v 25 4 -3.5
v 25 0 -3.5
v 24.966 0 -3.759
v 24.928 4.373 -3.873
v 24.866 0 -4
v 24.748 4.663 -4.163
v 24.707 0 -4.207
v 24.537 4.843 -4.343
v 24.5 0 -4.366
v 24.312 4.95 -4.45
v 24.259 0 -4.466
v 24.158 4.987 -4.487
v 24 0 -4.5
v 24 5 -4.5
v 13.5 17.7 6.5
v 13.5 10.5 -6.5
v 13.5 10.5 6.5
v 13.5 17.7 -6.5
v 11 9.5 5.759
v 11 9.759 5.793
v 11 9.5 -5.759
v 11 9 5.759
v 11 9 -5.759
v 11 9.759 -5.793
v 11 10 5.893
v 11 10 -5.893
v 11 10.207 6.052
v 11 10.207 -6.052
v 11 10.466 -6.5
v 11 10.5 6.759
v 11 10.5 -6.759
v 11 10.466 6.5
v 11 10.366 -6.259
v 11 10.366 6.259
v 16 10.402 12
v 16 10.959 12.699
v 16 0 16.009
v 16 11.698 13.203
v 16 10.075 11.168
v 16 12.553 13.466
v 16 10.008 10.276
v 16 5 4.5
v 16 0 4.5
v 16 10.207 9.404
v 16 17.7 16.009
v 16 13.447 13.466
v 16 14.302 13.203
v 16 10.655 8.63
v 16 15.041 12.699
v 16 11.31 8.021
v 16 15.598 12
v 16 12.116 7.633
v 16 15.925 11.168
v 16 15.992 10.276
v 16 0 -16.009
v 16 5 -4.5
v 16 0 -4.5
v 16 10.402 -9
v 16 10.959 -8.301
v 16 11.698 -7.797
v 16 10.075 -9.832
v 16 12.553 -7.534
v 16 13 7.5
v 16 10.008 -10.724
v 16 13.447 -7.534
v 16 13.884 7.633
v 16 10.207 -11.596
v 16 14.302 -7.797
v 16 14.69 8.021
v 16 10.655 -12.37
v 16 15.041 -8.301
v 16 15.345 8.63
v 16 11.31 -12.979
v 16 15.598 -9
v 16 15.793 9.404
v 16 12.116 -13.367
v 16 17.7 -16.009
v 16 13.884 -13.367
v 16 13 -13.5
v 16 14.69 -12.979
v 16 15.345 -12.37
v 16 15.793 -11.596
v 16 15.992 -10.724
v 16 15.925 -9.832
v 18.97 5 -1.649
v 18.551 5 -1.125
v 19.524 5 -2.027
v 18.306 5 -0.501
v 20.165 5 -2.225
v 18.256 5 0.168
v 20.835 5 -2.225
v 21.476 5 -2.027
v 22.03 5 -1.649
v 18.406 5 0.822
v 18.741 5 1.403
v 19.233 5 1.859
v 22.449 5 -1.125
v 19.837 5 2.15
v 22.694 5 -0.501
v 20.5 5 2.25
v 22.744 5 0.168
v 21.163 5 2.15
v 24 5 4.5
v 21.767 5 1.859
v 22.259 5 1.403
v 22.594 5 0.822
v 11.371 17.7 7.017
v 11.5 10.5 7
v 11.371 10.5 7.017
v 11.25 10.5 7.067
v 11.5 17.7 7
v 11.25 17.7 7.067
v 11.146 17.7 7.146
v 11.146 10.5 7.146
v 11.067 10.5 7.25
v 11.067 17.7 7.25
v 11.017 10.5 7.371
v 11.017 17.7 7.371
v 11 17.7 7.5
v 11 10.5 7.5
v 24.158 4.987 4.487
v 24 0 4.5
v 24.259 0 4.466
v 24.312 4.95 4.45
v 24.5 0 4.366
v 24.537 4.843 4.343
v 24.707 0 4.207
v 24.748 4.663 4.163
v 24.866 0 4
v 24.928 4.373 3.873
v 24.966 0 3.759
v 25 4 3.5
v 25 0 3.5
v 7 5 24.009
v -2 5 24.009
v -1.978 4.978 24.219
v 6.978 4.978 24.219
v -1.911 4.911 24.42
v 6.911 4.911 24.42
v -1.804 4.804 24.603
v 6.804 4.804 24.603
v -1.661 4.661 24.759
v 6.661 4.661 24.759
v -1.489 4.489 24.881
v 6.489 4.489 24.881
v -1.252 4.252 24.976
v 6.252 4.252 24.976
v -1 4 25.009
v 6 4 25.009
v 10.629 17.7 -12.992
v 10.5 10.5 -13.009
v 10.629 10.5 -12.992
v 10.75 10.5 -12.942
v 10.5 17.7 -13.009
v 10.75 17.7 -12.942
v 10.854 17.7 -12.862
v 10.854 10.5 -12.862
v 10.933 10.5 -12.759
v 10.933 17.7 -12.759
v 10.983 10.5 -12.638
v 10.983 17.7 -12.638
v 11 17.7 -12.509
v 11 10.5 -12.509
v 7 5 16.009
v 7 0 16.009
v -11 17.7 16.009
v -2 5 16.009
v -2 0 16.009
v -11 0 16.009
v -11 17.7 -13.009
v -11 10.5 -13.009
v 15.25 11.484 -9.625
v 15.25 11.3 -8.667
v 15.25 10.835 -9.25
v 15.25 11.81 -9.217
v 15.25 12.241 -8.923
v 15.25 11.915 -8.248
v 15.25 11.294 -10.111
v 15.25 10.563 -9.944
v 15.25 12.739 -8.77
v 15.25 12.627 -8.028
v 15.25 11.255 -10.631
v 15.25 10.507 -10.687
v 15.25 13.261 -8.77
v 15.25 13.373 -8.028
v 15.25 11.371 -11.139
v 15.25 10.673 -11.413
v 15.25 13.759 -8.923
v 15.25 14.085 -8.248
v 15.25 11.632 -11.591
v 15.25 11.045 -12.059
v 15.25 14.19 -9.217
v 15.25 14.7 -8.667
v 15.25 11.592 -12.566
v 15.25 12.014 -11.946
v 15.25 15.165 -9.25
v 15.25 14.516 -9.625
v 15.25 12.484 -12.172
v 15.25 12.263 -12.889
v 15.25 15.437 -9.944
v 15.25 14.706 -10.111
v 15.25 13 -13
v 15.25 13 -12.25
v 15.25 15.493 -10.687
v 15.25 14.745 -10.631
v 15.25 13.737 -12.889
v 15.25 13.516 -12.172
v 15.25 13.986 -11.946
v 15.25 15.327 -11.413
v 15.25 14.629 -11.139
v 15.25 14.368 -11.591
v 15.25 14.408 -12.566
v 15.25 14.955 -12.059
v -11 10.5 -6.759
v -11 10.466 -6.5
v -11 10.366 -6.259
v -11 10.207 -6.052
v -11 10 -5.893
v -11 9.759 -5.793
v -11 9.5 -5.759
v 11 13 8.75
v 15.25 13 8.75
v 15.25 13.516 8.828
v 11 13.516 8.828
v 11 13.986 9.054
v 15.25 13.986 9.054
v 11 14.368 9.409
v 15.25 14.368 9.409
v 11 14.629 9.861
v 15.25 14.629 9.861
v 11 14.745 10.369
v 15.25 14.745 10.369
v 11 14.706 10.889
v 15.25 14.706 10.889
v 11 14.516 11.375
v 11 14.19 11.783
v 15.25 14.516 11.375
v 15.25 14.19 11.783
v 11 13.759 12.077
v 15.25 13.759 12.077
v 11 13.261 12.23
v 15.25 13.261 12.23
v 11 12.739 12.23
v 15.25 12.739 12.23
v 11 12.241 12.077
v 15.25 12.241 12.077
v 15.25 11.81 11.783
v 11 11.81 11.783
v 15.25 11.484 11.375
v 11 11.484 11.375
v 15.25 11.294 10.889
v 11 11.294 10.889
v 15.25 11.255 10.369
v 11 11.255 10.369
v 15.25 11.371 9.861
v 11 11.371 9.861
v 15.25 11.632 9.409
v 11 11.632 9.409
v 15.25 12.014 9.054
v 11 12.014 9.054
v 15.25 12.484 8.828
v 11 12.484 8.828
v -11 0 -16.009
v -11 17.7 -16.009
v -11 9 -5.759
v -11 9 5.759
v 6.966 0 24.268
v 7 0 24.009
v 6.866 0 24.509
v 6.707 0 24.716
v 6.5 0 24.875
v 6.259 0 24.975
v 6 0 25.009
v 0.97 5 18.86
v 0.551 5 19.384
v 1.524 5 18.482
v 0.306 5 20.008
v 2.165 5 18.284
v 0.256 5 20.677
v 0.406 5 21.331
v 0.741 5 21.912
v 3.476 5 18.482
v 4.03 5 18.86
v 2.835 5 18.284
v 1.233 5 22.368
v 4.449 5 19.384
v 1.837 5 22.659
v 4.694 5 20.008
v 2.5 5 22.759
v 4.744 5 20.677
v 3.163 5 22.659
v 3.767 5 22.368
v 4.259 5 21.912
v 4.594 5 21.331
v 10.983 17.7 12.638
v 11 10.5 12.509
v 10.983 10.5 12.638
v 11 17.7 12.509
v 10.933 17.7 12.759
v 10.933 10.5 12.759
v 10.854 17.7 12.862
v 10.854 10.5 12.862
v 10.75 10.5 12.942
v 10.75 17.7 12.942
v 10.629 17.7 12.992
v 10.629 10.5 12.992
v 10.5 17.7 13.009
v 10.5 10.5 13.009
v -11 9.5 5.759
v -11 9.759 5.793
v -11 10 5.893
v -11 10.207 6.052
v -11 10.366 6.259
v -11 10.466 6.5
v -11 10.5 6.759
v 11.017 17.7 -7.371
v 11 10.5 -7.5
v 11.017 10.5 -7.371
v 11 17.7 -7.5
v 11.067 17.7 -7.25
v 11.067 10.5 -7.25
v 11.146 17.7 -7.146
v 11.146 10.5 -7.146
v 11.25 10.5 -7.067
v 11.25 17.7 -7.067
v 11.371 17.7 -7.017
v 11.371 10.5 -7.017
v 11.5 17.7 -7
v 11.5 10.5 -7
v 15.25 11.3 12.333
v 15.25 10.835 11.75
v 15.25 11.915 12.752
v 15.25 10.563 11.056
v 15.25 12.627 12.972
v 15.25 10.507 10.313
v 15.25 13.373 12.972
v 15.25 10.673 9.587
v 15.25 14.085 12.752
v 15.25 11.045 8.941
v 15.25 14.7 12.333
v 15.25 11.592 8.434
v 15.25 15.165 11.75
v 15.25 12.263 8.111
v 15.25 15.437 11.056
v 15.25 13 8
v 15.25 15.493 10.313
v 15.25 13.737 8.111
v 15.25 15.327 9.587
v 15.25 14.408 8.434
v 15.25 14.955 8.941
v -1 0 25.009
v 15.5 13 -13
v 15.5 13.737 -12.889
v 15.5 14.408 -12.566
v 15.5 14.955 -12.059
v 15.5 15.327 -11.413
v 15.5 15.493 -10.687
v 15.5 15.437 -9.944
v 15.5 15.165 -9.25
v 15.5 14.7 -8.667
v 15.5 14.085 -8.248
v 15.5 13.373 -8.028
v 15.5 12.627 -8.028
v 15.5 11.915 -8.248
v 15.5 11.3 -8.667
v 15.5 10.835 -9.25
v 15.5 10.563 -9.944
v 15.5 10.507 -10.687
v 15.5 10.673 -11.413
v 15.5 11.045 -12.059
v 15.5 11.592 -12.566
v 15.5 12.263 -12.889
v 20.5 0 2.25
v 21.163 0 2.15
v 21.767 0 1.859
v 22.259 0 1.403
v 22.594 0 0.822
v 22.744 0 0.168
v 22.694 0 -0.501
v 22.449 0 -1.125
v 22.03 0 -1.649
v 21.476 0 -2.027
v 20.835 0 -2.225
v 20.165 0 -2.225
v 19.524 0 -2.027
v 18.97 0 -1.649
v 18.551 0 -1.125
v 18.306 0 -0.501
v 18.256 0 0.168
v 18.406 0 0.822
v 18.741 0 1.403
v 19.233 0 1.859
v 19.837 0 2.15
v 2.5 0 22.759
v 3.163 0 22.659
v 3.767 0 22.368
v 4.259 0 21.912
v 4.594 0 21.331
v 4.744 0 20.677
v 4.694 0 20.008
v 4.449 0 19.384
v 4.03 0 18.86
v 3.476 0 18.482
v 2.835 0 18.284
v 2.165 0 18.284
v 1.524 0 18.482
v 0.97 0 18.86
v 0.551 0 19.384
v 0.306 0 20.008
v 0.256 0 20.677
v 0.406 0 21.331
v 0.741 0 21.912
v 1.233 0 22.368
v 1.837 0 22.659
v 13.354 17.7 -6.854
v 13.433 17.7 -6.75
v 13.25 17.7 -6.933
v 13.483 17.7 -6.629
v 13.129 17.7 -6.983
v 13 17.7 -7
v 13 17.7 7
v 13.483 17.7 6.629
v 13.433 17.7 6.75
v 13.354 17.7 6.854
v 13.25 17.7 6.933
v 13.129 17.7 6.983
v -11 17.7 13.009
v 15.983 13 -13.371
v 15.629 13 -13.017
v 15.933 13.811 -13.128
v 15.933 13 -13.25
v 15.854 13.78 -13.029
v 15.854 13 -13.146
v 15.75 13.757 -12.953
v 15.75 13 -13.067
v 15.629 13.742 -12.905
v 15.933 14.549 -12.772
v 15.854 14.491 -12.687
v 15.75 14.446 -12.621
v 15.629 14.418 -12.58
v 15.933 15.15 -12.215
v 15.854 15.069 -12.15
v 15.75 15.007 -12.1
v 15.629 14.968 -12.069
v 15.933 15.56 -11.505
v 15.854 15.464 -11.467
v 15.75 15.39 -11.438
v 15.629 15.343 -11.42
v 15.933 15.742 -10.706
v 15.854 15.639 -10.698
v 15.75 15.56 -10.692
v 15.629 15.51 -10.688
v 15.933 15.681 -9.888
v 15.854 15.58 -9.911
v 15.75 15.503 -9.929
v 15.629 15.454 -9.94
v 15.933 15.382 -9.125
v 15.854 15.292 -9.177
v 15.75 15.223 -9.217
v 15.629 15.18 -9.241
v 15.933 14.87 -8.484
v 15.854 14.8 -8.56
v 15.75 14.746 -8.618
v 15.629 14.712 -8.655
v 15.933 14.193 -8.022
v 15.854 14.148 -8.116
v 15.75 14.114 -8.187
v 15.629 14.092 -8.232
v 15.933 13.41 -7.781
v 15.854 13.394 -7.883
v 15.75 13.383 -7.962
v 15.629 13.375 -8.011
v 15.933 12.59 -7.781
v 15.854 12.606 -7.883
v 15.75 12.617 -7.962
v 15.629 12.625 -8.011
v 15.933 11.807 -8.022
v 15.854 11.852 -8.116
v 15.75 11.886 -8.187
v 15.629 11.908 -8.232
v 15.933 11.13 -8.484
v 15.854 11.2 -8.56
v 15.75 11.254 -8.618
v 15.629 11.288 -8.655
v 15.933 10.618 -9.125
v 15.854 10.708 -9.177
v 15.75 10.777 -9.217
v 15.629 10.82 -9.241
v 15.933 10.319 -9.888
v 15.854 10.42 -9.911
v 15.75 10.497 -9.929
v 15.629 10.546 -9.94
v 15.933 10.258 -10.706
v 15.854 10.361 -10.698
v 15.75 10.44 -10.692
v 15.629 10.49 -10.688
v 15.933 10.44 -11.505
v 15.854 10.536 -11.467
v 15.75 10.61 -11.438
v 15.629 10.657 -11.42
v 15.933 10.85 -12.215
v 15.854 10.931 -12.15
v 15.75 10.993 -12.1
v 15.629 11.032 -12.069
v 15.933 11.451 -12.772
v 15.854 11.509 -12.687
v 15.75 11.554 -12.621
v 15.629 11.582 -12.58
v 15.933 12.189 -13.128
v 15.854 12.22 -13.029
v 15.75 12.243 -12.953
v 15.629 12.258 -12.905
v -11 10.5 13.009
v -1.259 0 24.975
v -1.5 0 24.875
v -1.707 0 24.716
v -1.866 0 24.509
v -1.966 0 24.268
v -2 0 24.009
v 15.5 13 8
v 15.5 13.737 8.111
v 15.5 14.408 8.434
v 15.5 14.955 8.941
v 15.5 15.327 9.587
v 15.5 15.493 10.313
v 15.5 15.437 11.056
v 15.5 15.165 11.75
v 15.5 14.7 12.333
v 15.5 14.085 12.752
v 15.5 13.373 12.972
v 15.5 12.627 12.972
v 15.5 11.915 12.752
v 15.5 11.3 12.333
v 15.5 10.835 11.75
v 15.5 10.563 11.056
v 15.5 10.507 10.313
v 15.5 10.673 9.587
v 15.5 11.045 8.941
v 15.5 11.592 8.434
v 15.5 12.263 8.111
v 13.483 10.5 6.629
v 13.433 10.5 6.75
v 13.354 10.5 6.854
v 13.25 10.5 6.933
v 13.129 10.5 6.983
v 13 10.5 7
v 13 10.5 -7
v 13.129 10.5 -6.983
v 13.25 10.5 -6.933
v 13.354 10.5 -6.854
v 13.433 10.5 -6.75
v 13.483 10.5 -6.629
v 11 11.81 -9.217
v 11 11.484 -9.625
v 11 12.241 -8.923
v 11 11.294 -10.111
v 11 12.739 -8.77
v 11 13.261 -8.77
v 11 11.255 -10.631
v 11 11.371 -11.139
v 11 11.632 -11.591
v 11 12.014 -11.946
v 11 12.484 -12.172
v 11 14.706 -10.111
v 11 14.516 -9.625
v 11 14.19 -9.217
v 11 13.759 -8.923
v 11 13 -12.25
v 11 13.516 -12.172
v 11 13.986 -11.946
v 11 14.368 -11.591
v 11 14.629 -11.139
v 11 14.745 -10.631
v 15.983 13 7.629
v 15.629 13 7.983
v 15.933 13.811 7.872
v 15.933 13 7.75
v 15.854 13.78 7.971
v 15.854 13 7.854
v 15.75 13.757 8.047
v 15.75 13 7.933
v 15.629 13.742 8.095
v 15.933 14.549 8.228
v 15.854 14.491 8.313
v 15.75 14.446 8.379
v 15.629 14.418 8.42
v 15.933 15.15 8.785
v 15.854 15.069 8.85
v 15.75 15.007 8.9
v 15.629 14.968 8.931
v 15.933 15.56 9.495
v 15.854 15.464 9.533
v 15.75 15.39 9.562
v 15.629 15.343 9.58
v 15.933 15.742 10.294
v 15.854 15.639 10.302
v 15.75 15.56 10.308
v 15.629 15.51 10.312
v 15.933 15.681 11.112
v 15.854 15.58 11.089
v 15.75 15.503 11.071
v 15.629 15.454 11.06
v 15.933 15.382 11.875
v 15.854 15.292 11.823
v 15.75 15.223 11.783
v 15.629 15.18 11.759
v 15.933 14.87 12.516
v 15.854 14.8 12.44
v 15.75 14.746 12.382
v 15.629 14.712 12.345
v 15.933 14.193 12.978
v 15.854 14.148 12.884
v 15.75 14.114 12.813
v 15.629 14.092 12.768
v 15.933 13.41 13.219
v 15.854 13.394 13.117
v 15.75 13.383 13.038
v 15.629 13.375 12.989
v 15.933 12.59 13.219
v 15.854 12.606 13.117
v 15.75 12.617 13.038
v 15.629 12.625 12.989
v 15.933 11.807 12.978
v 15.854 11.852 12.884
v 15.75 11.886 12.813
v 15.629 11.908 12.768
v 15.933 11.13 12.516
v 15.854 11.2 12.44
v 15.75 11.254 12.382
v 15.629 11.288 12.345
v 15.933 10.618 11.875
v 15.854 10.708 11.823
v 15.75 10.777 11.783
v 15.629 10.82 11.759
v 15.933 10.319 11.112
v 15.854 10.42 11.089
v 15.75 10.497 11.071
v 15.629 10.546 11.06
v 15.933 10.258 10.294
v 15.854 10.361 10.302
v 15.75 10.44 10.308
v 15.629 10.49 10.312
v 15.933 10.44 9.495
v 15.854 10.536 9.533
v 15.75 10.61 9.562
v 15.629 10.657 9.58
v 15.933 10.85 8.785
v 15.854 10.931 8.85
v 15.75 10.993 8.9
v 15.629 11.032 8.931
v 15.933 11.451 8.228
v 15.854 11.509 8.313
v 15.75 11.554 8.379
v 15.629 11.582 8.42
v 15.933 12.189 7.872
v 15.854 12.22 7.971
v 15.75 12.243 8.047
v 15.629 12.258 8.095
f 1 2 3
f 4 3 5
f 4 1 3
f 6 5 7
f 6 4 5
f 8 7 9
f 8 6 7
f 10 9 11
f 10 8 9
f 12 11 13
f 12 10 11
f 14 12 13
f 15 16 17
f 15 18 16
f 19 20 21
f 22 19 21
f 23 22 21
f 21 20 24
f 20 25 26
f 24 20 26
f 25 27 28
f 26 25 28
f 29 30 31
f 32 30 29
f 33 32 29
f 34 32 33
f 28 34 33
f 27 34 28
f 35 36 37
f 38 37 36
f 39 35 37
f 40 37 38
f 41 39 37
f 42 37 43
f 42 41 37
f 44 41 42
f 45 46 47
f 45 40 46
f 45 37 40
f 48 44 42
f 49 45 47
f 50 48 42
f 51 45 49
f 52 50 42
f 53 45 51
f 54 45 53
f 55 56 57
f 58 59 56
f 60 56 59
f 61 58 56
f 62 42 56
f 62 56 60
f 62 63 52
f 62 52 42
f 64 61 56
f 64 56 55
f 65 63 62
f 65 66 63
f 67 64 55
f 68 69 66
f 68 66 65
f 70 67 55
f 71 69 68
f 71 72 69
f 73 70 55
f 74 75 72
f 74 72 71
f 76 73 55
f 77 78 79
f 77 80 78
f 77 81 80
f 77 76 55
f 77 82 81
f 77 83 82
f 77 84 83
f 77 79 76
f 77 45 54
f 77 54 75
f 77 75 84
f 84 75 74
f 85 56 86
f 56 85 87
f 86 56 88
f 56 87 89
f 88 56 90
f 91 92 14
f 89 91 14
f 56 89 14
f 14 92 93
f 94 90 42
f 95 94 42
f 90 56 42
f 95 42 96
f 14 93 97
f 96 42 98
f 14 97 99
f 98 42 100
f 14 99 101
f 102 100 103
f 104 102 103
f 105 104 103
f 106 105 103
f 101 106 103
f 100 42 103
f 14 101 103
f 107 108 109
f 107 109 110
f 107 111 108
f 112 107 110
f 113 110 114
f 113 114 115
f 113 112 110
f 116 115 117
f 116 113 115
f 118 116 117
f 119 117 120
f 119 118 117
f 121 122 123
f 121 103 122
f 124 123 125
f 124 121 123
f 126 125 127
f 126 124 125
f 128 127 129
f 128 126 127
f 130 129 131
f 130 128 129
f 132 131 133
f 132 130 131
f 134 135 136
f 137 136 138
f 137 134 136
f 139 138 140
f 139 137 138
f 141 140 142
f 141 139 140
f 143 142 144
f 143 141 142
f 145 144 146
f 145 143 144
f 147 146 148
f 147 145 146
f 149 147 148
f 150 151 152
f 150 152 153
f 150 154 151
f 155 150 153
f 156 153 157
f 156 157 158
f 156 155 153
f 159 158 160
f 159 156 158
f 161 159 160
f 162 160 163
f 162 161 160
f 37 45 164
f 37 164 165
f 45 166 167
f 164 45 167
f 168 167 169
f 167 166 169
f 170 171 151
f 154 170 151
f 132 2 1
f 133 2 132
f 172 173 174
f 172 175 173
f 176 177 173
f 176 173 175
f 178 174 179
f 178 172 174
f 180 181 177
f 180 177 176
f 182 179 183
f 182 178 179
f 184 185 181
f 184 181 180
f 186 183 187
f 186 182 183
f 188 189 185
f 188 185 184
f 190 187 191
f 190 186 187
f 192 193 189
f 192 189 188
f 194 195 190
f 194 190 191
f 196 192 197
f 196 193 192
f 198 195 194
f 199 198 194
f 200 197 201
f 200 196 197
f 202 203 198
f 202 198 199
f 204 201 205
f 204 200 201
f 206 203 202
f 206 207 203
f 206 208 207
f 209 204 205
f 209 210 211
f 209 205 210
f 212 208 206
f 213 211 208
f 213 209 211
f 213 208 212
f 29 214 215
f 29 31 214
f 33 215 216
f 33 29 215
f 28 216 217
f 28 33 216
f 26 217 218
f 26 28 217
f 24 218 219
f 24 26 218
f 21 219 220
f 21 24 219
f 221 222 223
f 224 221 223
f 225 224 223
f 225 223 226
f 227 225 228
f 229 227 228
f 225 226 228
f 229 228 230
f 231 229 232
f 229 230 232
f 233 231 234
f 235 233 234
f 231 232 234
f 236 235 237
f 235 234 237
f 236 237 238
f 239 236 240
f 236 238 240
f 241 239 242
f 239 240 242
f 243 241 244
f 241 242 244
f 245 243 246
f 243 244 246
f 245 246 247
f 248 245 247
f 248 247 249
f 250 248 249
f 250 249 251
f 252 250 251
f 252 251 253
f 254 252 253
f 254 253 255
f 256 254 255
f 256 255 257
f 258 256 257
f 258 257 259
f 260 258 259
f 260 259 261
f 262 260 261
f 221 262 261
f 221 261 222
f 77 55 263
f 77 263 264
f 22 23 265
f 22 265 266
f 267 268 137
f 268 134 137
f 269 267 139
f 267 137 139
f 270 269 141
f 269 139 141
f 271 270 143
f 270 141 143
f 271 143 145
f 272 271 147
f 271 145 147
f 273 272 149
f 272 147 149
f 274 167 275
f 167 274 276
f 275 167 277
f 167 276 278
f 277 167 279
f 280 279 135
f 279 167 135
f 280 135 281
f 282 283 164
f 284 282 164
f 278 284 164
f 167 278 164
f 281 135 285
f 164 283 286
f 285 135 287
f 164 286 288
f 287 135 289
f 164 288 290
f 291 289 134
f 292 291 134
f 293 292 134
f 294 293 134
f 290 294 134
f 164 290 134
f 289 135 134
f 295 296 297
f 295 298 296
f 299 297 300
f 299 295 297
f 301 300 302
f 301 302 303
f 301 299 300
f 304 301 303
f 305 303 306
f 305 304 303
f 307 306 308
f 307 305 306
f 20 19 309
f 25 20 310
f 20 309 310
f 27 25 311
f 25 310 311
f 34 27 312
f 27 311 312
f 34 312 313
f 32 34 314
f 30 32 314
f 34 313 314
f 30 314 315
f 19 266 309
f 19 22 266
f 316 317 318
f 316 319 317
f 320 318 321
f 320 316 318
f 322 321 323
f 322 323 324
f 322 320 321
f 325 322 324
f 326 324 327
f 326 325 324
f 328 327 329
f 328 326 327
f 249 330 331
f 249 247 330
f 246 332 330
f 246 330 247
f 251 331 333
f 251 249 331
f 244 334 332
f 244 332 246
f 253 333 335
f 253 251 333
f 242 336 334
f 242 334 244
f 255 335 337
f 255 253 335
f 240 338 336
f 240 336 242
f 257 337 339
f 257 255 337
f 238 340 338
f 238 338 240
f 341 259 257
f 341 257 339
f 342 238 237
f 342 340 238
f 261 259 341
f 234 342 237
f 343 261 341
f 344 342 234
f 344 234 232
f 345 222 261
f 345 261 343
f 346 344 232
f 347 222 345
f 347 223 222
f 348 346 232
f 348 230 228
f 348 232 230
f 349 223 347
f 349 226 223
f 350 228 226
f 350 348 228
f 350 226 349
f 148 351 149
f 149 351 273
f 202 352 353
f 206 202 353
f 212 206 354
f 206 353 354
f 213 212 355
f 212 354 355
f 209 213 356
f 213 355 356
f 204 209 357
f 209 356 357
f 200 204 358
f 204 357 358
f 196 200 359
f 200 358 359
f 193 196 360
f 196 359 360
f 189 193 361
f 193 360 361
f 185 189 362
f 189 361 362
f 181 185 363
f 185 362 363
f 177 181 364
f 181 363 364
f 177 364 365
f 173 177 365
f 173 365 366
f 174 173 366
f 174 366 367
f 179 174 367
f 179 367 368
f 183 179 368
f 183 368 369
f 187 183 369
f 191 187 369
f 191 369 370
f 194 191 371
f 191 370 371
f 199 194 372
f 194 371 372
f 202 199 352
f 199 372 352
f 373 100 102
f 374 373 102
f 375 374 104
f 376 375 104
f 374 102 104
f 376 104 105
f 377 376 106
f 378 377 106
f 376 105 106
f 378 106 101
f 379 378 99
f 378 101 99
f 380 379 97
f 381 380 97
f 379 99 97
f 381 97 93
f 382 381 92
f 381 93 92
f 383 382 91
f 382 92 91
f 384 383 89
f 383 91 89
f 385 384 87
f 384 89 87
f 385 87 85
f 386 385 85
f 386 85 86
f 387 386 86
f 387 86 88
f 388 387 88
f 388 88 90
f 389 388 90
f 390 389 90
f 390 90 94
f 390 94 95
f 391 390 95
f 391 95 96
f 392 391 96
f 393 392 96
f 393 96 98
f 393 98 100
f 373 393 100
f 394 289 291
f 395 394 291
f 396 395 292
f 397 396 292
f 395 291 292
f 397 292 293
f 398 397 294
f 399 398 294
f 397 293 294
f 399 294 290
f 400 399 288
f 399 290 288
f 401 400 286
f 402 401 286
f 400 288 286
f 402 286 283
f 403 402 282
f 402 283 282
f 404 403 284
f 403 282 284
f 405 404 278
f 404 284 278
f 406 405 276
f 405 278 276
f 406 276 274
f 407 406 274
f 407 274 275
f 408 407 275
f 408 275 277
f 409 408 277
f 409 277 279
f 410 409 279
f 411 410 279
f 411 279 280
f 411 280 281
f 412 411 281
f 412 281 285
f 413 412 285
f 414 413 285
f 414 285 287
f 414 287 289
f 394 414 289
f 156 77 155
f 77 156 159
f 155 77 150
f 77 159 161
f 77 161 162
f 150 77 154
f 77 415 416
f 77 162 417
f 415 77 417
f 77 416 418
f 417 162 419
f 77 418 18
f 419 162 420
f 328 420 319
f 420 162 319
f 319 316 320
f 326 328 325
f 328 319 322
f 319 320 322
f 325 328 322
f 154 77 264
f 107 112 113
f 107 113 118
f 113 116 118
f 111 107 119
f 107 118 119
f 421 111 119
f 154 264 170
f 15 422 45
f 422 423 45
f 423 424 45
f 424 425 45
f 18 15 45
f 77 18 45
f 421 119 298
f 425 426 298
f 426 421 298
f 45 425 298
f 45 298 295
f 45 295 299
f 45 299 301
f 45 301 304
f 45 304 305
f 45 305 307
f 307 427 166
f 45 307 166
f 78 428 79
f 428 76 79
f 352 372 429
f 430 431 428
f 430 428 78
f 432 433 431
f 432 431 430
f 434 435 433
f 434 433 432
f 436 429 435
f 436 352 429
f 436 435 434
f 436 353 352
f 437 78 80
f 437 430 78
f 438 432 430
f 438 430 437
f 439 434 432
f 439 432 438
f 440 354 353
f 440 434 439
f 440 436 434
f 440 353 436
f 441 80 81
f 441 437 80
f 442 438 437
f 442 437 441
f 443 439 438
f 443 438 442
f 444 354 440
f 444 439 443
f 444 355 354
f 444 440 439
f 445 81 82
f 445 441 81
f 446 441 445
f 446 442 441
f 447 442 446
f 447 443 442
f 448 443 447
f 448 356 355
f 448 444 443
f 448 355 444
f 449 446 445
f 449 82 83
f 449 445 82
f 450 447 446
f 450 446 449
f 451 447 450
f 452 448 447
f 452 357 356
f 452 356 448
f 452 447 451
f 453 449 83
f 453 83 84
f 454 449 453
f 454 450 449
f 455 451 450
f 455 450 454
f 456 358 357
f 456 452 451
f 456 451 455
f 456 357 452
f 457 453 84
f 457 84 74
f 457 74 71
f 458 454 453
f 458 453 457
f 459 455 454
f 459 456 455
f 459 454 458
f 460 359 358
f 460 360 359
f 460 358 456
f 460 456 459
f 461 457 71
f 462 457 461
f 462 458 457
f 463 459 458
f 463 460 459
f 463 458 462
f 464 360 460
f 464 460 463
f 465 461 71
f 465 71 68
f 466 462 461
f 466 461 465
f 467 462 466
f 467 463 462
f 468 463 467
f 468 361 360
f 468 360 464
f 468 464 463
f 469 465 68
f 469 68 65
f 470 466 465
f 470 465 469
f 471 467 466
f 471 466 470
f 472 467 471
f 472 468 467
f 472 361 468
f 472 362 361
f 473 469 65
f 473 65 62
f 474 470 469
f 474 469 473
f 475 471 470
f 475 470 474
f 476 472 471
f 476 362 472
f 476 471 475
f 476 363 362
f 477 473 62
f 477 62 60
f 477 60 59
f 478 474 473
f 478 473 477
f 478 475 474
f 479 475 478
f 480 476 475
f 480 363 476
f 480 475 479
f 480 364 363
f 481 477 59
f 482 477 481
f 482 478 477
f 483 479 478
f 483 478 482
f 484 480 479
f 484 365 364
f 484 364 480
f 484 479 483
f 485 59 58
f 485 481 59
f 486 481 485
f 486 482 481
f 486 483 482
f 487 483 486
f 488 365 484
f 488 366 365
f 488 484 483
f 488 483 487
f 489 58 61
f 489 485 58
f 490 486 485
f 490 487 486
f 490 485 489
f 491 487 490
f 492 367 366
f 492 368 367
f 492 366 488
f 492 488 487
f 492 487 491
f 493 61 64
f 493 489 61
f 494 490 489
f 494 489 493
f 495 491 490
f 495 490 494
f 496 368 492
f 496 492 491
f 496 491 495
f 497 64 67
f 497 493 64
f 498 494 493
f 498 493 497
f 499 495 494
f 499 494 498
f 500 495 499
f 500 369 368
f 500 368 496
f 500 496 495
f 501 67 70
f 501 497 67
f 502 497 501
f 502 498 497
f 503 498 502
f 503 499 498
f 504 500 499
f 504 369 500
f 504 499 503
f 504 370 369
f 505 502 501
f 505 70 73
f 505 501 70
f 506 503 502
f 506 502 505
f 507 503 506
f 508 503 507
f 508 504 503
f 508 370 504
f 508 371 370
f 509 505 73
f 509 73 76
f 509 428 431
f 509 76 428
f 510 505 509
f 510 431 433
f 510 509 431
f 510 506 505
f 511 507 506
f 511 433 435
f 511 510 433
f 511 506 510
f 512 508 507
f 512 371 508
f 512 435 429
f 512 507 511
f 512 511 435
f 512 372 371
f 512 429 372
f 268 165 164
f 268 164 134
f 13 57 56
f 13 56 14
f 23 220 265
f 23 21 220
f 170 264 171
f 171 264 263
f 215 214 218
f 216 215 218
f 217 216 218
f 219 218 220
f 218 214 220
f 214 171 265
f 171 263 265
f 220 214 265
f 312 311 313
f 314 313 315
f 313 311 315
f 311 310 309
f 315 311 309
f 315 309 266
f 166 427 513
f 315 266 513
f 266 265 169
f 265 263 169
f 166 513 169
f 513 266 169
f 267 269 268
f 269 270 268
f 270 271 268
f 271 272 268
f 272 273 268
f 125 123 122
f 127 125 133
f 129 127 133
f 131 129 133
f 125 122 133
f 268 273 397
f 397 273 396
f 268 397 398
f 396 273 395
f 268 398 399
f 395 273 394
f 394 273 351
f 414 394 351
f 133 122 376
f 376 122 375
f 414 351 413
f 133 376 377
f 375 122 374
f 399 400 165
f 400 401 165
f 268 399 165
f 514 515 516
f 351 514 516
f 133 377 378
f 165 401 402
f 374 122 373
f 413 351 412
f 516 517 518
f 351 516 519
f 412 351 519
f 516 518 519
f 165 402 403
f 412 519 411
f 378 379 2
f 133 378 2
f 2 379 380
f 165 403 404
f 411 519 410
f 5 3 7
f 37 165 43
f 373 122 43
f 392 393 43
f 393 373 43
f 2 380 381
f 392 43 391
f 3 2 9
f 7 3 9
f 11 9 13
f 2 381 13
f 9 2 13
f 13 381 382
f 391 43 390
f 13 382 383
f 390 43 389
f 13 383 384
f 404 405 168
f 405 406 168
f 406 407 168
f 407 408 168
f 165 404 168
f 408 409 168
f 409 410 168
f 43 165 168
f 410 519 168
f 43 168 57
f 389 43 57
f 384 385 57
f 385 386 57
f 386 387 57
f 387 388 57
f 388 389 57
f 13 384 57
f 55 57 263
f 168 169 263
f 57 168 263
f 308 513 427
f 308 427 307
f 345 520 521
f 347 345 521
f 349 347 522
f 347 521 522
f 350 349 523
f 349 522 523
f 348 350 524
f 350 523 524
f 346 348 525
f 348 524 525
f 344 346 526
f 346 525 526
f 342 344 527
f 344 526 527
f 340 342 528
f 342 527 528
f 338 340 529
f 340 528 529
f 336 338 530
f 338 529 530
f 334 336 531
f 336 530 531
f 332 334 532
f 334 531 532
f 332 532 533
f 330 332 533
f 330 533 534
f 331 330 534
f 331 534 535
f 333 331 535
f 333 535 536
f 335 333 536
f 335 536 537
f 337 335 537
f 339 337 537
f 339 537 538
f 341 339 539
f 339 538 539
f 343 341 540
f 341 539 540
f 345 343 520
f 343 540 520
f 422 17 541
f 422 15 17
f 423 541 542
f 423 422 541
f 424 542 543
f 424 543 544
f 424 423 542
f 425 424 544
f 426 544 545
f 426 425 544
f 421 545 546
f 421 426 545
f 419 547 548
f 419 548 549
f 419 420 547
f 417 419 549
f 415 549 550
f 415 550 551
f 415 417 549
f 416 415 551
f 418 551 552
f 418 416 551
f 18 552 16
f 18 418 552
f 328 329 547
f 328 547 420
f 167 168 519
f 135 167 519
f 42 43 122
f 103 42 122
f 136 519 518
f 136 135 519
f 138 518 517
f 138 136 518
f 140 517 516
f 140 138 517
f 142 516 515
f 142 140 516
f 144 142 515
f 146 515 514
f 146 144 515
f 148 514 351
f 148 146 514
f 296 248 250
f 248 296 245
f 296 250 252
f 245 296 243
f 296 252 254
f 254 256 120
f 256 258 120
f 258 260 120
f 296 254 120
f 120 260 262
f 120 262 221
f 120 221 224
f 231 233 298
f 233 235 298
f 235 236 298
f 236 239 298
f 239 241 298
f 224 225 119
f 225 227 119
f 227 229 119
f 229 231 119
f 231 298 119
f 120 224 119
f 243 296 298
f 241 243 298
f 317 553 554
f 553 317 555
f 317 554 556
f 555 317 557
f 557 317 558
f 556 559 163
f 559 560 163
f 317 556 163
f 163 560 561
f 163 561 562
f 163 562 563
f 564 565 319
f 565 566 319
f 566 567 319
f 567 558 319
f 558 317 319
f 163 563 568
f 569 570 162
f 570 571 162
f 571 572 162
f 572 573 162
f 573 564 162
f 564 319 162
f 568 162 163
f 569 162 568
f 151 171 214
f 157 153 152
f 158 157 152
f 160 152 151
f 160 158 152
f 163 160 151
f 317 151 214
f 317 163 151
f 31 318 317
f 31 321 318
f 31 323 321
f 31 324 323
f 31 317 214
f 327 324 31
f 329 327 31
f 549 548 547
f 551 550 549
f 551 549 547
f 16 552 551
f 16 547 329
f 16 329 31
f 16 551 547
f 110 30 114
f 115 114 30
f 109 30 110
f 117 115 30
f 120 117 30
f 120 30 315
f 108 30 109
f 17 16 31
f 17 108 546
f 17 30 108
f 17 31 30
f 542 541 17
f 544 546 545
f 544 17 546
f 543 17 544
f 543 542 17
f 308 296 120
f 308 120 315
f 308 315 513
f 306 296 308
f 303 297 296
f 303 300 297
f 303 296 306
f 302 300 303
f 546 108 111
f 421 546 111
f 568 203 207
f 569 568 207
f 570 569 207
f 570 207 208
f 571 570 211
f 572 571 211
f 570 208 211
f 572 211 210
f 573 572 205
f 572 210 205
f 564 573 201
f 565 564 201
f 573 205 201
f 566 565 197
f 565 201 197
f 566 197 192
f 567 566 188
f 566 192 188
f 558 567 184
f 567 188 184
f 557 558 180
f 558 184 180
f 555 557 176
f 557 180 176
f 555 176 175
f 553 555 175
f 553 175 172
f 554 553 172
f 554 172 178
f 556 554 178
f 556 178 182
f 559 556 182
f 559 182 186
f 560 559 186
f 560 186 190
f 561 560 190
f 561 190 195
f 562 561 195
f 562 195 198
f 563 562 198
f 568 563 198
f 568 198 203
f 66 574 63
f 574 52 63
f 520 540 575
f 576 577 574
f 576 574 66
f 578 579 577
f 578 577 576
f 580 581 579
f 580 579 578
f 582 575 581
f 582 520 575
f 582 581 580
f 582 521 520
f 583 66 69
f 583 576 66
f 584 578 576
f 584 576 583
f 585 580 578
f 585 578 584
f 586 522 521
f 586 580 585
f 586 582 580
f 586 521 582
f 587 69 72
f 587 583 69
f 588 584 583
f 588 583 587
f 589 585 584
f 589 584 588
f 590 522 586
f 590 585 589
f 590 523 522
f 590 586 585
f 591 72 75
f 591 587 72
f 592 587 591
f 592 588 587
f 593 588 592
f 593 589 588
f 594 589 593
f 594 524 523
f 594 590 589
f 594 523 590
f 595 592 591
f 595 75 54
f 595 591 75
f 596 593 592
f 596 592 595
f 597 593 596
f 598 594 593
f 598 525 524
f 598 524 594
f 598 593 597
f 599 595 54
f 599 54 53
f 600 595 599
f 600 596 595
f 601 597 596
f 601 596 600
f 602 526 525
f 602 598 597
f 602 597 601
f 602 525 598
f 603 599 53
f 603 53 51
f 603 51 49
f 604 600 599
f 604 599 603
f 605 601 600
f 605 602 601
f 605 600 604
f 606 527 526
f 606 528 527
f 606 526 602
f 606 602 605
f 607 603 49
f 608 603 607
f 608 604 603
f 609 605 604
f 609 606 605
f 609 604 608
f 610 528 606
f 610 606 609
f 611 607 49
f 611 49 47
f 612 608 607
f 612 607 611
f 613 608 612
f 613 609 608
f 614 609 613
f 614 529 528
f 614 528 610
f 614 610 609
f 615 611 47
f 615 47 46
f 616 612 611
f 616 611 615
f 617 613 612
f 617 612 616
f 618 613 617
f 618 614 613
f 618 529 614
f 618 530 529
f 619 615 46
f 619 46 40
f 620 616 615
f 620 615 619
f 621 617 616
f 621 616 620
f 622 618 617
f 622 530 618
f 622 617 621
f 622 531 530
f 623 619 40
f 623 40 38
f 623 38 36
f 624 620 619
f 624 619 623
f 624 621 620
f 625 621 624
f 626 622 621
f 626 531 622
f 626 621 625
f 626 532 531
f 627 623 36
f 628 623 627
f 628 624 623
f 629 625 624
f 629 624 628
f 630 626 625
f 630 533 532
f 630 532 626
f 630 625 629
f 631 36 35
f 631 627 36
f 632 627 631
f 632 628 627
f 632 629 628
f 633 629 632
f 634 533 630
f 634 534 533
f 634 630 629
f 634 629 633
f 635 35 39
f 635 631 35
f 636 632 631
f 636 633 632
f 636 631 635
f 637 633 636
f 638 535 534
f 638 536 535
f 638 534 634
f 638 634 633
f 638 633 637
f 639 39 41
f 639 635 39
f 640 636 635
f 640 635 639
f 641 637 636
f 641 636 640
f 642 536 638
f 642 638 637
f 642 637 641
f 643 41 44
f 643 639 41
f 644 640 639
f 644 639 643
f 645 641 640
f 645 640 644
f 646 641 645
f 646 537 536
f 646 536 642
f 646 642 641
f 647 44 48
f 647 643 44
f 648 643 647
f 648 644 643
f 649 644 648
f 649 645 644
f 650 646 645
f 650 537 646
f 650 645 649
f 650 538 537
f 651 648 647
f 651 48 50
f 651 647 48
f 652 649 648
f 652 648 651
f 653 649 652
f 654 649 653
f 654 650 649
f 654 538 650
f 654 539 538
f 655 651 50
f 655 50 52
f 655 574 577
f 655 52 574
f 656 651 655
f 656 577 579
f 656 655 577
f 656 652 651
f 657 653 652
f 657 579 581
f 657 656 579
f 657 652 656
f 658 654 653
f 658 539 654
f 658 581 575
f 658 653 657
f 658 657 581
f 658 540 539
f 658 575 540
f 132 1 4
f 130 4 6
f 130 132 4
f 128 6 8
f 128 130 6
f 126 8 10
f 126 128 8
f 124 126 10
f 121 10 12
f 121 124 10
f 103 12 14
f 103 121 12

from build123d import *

# Parameters (mm, degrees)
BOSS_EXTRUDE1_DEPTH = 11
SKETCH3_W           = 22
SKETCH3_H           = 3
BOSS_EXTRUDE2_DEPTH = 17.7
BOSS_EXTRUDE3_DEPTH = 5
SKETCH5_R           = 1.75
CUT_EXTRUDE1_DEPTH  = 37.035744466
SKETCH6_W           = 9
SKETCH6_H           = 9
BOSS_EXTRUDE4_DEPTH = 5
SKETCH7_R           = 2.25
CUT_EXTRUDE2_DEPTH  = 38.573063213
FILLET1_R           = 1
SKETCH8_R           = 2.5
CUT_EXTRUDE3_DEPTH  = 0.75
FILLET2_R           = 0.5
SKETCH10_W          = 14
SKETCH10_H          = 7.2
CUT_EXTRUDE4_DEPTH  = 2.5
FILLET3_R           = 0.5


with BuildPart() as part:
    # Sketch1 → Boss-Extrude1 (new, symmetric)
    with BuildSketch(Plane(origin=(0, 0, 0), x_dir=(0, 0, -1), z_dir=(1, 0, 0))):
        Polygon((-13.0089, 0), (13.0089, 0), (13.0089, 10.5), (5.7589, 10.5), (5.7589, 9), (-5.7589, 9), (-5.7589, 10.5), (-13.0089, 10.5), align=None)
    extrude(amount=BOSS_EXTRUDE1_DEPTH, both=True)

    # Sketch3 → Boss-Extrude2 (add)
    with BuildSketch(Plane.XZ):
        with Locations((0, -14.5089)):
            Rectangle(SKETCH3_W, SKETCH3_H)
        with Locations((0, 14.5089)):
            Rectangle(SKETCH3_W, SKETCH3_H)
    extrude(amount=-BOSS_EXTRUDE2_DEPTH)

    # Sketch4 → Boss-Extrude3 (add)
    with BuildSketch(Plane(origin=(11, 0, 0), x_dir=(0, 0, -1), z_dir=(1, 0, 0))):
        Polygon((-8.8, 17.7), (-16.0089, 17.7), (-16.0089, 0), (16.0089, 0), (16.0089, 17.7), align=None)
    extrude(amount=BOSS_EXTRUDE3_DEPTH)

    # Sketch5 → Cut-Extrude1 (cut, through all)
    with BuildSketch(Plane(origin=(16, 0, 0), x_dir=(0, 0, -1), z_dir=(1, 0, 0))):
        with Locations((-10.5, 13)):
            Circle(SKETCH5_R)
        with Locations((10.5, 13)):
            Circle(SKETCH5_R)
    extrude(amount=-CUT_EXTRUDE1_DEPTH, mode=Mode.SUBTRACT)

    # Sketch6 → Boss-Extrude4 (add)
    with BuildSketch(Plane.XZ):
        with Locations((20.5, 0)):
            Rectangle(SKETCH6_W, SKETCH6_H)
        with Locations((2.5, 20.5089)):
            Rectangle(SKETCH6_W, SKETCH6_H)
    extrude(amount=-BOSS_EXTRUDE4_DEPTH)

    # Sketch7 → Cut-Extrude2 (cut, through all)
    with BuildSketch(Plane(origin=(0, 5, 0), x_dir=(1, 0, 0), z_dir=(0, 1, 0))):
        with Locations(Location((20.5, 0, 0), (0, 0, 270))):
            Circle(SKETCH7_R)
        with Locations(Location((2.5, -20.5089, 0), (0, 0, 270))):
            Circle(SKETCH7_R)
    extrude(amount=-CUT_EXTRUDE2_DEPTH, mode=Mode.SUBTRACT)

    # Fillet1
    fillet1_edges = [part.edges().sort_by_distance(p)[0] for p in [
        (0, 10.5, 5.7589),
        (0, 10.5, -5.7589),
        (25, 5, 0),
        (25, 2.5, 4.5),
        (25, 2.5, -4.5),
        (7, 2.5, 25.0089),
        (2.5, 5, 25.0089),
        (-2, 2.5, 25.0089),
    ]]
    fillet(fillet1_edges, radius=FILLET1_R)

    # Sketch8 → Cut-Extrude3 (cut)
    with BuildSketch(Plane(origin=(16, 0, 0), x_dir=(0, 0, -1), z_dir=(1, 0, 0))):
        with Locations((-10.5, 13)):
            Circle(SKETCH8_R)
        with Locations((10.5, 13)):
            Circle(SKETCH8_R)
    extrude(amount=-CUT_EXTRUDE3_DEPTH, mode=Mode.SUBTRACT)

    # Fillet2
    fillet2_edges = [part.edges().sort_by_distance(p)[0] for p in [
        (16, 13, 13),
        (16, 13, -8),
    ]]
    fillet(fillet2_edges, radius=FILLET2_R)

    # Sketch10 → Cut-Extrude4 (cut)
    with BuildSketch(Plane.ZY.offset(-11)):
        with Locations((0, 14.1)):
            Rectangle(SKETCH10_W, SKETCH10_H)
    extrude(amount=-CUT_EXTRUDE4_DEPTH, mode=Mode.SUBTRACT)

    # Fillet3
    fillet3_edges = [part.edges().sort_by_distance(p)[0] for p in [
        (13.5, 14.1, -7),
        (13.5, 14.1, 7),
        (11, 14.1, -7),
        (11, 14.1, 7),
        (11, 14.1, -13.0089),
        (11, 14.1, 13.0089),
    ]]
    fillet(fillet3_edges, radius=FILLET3_R)


solid = part.part
